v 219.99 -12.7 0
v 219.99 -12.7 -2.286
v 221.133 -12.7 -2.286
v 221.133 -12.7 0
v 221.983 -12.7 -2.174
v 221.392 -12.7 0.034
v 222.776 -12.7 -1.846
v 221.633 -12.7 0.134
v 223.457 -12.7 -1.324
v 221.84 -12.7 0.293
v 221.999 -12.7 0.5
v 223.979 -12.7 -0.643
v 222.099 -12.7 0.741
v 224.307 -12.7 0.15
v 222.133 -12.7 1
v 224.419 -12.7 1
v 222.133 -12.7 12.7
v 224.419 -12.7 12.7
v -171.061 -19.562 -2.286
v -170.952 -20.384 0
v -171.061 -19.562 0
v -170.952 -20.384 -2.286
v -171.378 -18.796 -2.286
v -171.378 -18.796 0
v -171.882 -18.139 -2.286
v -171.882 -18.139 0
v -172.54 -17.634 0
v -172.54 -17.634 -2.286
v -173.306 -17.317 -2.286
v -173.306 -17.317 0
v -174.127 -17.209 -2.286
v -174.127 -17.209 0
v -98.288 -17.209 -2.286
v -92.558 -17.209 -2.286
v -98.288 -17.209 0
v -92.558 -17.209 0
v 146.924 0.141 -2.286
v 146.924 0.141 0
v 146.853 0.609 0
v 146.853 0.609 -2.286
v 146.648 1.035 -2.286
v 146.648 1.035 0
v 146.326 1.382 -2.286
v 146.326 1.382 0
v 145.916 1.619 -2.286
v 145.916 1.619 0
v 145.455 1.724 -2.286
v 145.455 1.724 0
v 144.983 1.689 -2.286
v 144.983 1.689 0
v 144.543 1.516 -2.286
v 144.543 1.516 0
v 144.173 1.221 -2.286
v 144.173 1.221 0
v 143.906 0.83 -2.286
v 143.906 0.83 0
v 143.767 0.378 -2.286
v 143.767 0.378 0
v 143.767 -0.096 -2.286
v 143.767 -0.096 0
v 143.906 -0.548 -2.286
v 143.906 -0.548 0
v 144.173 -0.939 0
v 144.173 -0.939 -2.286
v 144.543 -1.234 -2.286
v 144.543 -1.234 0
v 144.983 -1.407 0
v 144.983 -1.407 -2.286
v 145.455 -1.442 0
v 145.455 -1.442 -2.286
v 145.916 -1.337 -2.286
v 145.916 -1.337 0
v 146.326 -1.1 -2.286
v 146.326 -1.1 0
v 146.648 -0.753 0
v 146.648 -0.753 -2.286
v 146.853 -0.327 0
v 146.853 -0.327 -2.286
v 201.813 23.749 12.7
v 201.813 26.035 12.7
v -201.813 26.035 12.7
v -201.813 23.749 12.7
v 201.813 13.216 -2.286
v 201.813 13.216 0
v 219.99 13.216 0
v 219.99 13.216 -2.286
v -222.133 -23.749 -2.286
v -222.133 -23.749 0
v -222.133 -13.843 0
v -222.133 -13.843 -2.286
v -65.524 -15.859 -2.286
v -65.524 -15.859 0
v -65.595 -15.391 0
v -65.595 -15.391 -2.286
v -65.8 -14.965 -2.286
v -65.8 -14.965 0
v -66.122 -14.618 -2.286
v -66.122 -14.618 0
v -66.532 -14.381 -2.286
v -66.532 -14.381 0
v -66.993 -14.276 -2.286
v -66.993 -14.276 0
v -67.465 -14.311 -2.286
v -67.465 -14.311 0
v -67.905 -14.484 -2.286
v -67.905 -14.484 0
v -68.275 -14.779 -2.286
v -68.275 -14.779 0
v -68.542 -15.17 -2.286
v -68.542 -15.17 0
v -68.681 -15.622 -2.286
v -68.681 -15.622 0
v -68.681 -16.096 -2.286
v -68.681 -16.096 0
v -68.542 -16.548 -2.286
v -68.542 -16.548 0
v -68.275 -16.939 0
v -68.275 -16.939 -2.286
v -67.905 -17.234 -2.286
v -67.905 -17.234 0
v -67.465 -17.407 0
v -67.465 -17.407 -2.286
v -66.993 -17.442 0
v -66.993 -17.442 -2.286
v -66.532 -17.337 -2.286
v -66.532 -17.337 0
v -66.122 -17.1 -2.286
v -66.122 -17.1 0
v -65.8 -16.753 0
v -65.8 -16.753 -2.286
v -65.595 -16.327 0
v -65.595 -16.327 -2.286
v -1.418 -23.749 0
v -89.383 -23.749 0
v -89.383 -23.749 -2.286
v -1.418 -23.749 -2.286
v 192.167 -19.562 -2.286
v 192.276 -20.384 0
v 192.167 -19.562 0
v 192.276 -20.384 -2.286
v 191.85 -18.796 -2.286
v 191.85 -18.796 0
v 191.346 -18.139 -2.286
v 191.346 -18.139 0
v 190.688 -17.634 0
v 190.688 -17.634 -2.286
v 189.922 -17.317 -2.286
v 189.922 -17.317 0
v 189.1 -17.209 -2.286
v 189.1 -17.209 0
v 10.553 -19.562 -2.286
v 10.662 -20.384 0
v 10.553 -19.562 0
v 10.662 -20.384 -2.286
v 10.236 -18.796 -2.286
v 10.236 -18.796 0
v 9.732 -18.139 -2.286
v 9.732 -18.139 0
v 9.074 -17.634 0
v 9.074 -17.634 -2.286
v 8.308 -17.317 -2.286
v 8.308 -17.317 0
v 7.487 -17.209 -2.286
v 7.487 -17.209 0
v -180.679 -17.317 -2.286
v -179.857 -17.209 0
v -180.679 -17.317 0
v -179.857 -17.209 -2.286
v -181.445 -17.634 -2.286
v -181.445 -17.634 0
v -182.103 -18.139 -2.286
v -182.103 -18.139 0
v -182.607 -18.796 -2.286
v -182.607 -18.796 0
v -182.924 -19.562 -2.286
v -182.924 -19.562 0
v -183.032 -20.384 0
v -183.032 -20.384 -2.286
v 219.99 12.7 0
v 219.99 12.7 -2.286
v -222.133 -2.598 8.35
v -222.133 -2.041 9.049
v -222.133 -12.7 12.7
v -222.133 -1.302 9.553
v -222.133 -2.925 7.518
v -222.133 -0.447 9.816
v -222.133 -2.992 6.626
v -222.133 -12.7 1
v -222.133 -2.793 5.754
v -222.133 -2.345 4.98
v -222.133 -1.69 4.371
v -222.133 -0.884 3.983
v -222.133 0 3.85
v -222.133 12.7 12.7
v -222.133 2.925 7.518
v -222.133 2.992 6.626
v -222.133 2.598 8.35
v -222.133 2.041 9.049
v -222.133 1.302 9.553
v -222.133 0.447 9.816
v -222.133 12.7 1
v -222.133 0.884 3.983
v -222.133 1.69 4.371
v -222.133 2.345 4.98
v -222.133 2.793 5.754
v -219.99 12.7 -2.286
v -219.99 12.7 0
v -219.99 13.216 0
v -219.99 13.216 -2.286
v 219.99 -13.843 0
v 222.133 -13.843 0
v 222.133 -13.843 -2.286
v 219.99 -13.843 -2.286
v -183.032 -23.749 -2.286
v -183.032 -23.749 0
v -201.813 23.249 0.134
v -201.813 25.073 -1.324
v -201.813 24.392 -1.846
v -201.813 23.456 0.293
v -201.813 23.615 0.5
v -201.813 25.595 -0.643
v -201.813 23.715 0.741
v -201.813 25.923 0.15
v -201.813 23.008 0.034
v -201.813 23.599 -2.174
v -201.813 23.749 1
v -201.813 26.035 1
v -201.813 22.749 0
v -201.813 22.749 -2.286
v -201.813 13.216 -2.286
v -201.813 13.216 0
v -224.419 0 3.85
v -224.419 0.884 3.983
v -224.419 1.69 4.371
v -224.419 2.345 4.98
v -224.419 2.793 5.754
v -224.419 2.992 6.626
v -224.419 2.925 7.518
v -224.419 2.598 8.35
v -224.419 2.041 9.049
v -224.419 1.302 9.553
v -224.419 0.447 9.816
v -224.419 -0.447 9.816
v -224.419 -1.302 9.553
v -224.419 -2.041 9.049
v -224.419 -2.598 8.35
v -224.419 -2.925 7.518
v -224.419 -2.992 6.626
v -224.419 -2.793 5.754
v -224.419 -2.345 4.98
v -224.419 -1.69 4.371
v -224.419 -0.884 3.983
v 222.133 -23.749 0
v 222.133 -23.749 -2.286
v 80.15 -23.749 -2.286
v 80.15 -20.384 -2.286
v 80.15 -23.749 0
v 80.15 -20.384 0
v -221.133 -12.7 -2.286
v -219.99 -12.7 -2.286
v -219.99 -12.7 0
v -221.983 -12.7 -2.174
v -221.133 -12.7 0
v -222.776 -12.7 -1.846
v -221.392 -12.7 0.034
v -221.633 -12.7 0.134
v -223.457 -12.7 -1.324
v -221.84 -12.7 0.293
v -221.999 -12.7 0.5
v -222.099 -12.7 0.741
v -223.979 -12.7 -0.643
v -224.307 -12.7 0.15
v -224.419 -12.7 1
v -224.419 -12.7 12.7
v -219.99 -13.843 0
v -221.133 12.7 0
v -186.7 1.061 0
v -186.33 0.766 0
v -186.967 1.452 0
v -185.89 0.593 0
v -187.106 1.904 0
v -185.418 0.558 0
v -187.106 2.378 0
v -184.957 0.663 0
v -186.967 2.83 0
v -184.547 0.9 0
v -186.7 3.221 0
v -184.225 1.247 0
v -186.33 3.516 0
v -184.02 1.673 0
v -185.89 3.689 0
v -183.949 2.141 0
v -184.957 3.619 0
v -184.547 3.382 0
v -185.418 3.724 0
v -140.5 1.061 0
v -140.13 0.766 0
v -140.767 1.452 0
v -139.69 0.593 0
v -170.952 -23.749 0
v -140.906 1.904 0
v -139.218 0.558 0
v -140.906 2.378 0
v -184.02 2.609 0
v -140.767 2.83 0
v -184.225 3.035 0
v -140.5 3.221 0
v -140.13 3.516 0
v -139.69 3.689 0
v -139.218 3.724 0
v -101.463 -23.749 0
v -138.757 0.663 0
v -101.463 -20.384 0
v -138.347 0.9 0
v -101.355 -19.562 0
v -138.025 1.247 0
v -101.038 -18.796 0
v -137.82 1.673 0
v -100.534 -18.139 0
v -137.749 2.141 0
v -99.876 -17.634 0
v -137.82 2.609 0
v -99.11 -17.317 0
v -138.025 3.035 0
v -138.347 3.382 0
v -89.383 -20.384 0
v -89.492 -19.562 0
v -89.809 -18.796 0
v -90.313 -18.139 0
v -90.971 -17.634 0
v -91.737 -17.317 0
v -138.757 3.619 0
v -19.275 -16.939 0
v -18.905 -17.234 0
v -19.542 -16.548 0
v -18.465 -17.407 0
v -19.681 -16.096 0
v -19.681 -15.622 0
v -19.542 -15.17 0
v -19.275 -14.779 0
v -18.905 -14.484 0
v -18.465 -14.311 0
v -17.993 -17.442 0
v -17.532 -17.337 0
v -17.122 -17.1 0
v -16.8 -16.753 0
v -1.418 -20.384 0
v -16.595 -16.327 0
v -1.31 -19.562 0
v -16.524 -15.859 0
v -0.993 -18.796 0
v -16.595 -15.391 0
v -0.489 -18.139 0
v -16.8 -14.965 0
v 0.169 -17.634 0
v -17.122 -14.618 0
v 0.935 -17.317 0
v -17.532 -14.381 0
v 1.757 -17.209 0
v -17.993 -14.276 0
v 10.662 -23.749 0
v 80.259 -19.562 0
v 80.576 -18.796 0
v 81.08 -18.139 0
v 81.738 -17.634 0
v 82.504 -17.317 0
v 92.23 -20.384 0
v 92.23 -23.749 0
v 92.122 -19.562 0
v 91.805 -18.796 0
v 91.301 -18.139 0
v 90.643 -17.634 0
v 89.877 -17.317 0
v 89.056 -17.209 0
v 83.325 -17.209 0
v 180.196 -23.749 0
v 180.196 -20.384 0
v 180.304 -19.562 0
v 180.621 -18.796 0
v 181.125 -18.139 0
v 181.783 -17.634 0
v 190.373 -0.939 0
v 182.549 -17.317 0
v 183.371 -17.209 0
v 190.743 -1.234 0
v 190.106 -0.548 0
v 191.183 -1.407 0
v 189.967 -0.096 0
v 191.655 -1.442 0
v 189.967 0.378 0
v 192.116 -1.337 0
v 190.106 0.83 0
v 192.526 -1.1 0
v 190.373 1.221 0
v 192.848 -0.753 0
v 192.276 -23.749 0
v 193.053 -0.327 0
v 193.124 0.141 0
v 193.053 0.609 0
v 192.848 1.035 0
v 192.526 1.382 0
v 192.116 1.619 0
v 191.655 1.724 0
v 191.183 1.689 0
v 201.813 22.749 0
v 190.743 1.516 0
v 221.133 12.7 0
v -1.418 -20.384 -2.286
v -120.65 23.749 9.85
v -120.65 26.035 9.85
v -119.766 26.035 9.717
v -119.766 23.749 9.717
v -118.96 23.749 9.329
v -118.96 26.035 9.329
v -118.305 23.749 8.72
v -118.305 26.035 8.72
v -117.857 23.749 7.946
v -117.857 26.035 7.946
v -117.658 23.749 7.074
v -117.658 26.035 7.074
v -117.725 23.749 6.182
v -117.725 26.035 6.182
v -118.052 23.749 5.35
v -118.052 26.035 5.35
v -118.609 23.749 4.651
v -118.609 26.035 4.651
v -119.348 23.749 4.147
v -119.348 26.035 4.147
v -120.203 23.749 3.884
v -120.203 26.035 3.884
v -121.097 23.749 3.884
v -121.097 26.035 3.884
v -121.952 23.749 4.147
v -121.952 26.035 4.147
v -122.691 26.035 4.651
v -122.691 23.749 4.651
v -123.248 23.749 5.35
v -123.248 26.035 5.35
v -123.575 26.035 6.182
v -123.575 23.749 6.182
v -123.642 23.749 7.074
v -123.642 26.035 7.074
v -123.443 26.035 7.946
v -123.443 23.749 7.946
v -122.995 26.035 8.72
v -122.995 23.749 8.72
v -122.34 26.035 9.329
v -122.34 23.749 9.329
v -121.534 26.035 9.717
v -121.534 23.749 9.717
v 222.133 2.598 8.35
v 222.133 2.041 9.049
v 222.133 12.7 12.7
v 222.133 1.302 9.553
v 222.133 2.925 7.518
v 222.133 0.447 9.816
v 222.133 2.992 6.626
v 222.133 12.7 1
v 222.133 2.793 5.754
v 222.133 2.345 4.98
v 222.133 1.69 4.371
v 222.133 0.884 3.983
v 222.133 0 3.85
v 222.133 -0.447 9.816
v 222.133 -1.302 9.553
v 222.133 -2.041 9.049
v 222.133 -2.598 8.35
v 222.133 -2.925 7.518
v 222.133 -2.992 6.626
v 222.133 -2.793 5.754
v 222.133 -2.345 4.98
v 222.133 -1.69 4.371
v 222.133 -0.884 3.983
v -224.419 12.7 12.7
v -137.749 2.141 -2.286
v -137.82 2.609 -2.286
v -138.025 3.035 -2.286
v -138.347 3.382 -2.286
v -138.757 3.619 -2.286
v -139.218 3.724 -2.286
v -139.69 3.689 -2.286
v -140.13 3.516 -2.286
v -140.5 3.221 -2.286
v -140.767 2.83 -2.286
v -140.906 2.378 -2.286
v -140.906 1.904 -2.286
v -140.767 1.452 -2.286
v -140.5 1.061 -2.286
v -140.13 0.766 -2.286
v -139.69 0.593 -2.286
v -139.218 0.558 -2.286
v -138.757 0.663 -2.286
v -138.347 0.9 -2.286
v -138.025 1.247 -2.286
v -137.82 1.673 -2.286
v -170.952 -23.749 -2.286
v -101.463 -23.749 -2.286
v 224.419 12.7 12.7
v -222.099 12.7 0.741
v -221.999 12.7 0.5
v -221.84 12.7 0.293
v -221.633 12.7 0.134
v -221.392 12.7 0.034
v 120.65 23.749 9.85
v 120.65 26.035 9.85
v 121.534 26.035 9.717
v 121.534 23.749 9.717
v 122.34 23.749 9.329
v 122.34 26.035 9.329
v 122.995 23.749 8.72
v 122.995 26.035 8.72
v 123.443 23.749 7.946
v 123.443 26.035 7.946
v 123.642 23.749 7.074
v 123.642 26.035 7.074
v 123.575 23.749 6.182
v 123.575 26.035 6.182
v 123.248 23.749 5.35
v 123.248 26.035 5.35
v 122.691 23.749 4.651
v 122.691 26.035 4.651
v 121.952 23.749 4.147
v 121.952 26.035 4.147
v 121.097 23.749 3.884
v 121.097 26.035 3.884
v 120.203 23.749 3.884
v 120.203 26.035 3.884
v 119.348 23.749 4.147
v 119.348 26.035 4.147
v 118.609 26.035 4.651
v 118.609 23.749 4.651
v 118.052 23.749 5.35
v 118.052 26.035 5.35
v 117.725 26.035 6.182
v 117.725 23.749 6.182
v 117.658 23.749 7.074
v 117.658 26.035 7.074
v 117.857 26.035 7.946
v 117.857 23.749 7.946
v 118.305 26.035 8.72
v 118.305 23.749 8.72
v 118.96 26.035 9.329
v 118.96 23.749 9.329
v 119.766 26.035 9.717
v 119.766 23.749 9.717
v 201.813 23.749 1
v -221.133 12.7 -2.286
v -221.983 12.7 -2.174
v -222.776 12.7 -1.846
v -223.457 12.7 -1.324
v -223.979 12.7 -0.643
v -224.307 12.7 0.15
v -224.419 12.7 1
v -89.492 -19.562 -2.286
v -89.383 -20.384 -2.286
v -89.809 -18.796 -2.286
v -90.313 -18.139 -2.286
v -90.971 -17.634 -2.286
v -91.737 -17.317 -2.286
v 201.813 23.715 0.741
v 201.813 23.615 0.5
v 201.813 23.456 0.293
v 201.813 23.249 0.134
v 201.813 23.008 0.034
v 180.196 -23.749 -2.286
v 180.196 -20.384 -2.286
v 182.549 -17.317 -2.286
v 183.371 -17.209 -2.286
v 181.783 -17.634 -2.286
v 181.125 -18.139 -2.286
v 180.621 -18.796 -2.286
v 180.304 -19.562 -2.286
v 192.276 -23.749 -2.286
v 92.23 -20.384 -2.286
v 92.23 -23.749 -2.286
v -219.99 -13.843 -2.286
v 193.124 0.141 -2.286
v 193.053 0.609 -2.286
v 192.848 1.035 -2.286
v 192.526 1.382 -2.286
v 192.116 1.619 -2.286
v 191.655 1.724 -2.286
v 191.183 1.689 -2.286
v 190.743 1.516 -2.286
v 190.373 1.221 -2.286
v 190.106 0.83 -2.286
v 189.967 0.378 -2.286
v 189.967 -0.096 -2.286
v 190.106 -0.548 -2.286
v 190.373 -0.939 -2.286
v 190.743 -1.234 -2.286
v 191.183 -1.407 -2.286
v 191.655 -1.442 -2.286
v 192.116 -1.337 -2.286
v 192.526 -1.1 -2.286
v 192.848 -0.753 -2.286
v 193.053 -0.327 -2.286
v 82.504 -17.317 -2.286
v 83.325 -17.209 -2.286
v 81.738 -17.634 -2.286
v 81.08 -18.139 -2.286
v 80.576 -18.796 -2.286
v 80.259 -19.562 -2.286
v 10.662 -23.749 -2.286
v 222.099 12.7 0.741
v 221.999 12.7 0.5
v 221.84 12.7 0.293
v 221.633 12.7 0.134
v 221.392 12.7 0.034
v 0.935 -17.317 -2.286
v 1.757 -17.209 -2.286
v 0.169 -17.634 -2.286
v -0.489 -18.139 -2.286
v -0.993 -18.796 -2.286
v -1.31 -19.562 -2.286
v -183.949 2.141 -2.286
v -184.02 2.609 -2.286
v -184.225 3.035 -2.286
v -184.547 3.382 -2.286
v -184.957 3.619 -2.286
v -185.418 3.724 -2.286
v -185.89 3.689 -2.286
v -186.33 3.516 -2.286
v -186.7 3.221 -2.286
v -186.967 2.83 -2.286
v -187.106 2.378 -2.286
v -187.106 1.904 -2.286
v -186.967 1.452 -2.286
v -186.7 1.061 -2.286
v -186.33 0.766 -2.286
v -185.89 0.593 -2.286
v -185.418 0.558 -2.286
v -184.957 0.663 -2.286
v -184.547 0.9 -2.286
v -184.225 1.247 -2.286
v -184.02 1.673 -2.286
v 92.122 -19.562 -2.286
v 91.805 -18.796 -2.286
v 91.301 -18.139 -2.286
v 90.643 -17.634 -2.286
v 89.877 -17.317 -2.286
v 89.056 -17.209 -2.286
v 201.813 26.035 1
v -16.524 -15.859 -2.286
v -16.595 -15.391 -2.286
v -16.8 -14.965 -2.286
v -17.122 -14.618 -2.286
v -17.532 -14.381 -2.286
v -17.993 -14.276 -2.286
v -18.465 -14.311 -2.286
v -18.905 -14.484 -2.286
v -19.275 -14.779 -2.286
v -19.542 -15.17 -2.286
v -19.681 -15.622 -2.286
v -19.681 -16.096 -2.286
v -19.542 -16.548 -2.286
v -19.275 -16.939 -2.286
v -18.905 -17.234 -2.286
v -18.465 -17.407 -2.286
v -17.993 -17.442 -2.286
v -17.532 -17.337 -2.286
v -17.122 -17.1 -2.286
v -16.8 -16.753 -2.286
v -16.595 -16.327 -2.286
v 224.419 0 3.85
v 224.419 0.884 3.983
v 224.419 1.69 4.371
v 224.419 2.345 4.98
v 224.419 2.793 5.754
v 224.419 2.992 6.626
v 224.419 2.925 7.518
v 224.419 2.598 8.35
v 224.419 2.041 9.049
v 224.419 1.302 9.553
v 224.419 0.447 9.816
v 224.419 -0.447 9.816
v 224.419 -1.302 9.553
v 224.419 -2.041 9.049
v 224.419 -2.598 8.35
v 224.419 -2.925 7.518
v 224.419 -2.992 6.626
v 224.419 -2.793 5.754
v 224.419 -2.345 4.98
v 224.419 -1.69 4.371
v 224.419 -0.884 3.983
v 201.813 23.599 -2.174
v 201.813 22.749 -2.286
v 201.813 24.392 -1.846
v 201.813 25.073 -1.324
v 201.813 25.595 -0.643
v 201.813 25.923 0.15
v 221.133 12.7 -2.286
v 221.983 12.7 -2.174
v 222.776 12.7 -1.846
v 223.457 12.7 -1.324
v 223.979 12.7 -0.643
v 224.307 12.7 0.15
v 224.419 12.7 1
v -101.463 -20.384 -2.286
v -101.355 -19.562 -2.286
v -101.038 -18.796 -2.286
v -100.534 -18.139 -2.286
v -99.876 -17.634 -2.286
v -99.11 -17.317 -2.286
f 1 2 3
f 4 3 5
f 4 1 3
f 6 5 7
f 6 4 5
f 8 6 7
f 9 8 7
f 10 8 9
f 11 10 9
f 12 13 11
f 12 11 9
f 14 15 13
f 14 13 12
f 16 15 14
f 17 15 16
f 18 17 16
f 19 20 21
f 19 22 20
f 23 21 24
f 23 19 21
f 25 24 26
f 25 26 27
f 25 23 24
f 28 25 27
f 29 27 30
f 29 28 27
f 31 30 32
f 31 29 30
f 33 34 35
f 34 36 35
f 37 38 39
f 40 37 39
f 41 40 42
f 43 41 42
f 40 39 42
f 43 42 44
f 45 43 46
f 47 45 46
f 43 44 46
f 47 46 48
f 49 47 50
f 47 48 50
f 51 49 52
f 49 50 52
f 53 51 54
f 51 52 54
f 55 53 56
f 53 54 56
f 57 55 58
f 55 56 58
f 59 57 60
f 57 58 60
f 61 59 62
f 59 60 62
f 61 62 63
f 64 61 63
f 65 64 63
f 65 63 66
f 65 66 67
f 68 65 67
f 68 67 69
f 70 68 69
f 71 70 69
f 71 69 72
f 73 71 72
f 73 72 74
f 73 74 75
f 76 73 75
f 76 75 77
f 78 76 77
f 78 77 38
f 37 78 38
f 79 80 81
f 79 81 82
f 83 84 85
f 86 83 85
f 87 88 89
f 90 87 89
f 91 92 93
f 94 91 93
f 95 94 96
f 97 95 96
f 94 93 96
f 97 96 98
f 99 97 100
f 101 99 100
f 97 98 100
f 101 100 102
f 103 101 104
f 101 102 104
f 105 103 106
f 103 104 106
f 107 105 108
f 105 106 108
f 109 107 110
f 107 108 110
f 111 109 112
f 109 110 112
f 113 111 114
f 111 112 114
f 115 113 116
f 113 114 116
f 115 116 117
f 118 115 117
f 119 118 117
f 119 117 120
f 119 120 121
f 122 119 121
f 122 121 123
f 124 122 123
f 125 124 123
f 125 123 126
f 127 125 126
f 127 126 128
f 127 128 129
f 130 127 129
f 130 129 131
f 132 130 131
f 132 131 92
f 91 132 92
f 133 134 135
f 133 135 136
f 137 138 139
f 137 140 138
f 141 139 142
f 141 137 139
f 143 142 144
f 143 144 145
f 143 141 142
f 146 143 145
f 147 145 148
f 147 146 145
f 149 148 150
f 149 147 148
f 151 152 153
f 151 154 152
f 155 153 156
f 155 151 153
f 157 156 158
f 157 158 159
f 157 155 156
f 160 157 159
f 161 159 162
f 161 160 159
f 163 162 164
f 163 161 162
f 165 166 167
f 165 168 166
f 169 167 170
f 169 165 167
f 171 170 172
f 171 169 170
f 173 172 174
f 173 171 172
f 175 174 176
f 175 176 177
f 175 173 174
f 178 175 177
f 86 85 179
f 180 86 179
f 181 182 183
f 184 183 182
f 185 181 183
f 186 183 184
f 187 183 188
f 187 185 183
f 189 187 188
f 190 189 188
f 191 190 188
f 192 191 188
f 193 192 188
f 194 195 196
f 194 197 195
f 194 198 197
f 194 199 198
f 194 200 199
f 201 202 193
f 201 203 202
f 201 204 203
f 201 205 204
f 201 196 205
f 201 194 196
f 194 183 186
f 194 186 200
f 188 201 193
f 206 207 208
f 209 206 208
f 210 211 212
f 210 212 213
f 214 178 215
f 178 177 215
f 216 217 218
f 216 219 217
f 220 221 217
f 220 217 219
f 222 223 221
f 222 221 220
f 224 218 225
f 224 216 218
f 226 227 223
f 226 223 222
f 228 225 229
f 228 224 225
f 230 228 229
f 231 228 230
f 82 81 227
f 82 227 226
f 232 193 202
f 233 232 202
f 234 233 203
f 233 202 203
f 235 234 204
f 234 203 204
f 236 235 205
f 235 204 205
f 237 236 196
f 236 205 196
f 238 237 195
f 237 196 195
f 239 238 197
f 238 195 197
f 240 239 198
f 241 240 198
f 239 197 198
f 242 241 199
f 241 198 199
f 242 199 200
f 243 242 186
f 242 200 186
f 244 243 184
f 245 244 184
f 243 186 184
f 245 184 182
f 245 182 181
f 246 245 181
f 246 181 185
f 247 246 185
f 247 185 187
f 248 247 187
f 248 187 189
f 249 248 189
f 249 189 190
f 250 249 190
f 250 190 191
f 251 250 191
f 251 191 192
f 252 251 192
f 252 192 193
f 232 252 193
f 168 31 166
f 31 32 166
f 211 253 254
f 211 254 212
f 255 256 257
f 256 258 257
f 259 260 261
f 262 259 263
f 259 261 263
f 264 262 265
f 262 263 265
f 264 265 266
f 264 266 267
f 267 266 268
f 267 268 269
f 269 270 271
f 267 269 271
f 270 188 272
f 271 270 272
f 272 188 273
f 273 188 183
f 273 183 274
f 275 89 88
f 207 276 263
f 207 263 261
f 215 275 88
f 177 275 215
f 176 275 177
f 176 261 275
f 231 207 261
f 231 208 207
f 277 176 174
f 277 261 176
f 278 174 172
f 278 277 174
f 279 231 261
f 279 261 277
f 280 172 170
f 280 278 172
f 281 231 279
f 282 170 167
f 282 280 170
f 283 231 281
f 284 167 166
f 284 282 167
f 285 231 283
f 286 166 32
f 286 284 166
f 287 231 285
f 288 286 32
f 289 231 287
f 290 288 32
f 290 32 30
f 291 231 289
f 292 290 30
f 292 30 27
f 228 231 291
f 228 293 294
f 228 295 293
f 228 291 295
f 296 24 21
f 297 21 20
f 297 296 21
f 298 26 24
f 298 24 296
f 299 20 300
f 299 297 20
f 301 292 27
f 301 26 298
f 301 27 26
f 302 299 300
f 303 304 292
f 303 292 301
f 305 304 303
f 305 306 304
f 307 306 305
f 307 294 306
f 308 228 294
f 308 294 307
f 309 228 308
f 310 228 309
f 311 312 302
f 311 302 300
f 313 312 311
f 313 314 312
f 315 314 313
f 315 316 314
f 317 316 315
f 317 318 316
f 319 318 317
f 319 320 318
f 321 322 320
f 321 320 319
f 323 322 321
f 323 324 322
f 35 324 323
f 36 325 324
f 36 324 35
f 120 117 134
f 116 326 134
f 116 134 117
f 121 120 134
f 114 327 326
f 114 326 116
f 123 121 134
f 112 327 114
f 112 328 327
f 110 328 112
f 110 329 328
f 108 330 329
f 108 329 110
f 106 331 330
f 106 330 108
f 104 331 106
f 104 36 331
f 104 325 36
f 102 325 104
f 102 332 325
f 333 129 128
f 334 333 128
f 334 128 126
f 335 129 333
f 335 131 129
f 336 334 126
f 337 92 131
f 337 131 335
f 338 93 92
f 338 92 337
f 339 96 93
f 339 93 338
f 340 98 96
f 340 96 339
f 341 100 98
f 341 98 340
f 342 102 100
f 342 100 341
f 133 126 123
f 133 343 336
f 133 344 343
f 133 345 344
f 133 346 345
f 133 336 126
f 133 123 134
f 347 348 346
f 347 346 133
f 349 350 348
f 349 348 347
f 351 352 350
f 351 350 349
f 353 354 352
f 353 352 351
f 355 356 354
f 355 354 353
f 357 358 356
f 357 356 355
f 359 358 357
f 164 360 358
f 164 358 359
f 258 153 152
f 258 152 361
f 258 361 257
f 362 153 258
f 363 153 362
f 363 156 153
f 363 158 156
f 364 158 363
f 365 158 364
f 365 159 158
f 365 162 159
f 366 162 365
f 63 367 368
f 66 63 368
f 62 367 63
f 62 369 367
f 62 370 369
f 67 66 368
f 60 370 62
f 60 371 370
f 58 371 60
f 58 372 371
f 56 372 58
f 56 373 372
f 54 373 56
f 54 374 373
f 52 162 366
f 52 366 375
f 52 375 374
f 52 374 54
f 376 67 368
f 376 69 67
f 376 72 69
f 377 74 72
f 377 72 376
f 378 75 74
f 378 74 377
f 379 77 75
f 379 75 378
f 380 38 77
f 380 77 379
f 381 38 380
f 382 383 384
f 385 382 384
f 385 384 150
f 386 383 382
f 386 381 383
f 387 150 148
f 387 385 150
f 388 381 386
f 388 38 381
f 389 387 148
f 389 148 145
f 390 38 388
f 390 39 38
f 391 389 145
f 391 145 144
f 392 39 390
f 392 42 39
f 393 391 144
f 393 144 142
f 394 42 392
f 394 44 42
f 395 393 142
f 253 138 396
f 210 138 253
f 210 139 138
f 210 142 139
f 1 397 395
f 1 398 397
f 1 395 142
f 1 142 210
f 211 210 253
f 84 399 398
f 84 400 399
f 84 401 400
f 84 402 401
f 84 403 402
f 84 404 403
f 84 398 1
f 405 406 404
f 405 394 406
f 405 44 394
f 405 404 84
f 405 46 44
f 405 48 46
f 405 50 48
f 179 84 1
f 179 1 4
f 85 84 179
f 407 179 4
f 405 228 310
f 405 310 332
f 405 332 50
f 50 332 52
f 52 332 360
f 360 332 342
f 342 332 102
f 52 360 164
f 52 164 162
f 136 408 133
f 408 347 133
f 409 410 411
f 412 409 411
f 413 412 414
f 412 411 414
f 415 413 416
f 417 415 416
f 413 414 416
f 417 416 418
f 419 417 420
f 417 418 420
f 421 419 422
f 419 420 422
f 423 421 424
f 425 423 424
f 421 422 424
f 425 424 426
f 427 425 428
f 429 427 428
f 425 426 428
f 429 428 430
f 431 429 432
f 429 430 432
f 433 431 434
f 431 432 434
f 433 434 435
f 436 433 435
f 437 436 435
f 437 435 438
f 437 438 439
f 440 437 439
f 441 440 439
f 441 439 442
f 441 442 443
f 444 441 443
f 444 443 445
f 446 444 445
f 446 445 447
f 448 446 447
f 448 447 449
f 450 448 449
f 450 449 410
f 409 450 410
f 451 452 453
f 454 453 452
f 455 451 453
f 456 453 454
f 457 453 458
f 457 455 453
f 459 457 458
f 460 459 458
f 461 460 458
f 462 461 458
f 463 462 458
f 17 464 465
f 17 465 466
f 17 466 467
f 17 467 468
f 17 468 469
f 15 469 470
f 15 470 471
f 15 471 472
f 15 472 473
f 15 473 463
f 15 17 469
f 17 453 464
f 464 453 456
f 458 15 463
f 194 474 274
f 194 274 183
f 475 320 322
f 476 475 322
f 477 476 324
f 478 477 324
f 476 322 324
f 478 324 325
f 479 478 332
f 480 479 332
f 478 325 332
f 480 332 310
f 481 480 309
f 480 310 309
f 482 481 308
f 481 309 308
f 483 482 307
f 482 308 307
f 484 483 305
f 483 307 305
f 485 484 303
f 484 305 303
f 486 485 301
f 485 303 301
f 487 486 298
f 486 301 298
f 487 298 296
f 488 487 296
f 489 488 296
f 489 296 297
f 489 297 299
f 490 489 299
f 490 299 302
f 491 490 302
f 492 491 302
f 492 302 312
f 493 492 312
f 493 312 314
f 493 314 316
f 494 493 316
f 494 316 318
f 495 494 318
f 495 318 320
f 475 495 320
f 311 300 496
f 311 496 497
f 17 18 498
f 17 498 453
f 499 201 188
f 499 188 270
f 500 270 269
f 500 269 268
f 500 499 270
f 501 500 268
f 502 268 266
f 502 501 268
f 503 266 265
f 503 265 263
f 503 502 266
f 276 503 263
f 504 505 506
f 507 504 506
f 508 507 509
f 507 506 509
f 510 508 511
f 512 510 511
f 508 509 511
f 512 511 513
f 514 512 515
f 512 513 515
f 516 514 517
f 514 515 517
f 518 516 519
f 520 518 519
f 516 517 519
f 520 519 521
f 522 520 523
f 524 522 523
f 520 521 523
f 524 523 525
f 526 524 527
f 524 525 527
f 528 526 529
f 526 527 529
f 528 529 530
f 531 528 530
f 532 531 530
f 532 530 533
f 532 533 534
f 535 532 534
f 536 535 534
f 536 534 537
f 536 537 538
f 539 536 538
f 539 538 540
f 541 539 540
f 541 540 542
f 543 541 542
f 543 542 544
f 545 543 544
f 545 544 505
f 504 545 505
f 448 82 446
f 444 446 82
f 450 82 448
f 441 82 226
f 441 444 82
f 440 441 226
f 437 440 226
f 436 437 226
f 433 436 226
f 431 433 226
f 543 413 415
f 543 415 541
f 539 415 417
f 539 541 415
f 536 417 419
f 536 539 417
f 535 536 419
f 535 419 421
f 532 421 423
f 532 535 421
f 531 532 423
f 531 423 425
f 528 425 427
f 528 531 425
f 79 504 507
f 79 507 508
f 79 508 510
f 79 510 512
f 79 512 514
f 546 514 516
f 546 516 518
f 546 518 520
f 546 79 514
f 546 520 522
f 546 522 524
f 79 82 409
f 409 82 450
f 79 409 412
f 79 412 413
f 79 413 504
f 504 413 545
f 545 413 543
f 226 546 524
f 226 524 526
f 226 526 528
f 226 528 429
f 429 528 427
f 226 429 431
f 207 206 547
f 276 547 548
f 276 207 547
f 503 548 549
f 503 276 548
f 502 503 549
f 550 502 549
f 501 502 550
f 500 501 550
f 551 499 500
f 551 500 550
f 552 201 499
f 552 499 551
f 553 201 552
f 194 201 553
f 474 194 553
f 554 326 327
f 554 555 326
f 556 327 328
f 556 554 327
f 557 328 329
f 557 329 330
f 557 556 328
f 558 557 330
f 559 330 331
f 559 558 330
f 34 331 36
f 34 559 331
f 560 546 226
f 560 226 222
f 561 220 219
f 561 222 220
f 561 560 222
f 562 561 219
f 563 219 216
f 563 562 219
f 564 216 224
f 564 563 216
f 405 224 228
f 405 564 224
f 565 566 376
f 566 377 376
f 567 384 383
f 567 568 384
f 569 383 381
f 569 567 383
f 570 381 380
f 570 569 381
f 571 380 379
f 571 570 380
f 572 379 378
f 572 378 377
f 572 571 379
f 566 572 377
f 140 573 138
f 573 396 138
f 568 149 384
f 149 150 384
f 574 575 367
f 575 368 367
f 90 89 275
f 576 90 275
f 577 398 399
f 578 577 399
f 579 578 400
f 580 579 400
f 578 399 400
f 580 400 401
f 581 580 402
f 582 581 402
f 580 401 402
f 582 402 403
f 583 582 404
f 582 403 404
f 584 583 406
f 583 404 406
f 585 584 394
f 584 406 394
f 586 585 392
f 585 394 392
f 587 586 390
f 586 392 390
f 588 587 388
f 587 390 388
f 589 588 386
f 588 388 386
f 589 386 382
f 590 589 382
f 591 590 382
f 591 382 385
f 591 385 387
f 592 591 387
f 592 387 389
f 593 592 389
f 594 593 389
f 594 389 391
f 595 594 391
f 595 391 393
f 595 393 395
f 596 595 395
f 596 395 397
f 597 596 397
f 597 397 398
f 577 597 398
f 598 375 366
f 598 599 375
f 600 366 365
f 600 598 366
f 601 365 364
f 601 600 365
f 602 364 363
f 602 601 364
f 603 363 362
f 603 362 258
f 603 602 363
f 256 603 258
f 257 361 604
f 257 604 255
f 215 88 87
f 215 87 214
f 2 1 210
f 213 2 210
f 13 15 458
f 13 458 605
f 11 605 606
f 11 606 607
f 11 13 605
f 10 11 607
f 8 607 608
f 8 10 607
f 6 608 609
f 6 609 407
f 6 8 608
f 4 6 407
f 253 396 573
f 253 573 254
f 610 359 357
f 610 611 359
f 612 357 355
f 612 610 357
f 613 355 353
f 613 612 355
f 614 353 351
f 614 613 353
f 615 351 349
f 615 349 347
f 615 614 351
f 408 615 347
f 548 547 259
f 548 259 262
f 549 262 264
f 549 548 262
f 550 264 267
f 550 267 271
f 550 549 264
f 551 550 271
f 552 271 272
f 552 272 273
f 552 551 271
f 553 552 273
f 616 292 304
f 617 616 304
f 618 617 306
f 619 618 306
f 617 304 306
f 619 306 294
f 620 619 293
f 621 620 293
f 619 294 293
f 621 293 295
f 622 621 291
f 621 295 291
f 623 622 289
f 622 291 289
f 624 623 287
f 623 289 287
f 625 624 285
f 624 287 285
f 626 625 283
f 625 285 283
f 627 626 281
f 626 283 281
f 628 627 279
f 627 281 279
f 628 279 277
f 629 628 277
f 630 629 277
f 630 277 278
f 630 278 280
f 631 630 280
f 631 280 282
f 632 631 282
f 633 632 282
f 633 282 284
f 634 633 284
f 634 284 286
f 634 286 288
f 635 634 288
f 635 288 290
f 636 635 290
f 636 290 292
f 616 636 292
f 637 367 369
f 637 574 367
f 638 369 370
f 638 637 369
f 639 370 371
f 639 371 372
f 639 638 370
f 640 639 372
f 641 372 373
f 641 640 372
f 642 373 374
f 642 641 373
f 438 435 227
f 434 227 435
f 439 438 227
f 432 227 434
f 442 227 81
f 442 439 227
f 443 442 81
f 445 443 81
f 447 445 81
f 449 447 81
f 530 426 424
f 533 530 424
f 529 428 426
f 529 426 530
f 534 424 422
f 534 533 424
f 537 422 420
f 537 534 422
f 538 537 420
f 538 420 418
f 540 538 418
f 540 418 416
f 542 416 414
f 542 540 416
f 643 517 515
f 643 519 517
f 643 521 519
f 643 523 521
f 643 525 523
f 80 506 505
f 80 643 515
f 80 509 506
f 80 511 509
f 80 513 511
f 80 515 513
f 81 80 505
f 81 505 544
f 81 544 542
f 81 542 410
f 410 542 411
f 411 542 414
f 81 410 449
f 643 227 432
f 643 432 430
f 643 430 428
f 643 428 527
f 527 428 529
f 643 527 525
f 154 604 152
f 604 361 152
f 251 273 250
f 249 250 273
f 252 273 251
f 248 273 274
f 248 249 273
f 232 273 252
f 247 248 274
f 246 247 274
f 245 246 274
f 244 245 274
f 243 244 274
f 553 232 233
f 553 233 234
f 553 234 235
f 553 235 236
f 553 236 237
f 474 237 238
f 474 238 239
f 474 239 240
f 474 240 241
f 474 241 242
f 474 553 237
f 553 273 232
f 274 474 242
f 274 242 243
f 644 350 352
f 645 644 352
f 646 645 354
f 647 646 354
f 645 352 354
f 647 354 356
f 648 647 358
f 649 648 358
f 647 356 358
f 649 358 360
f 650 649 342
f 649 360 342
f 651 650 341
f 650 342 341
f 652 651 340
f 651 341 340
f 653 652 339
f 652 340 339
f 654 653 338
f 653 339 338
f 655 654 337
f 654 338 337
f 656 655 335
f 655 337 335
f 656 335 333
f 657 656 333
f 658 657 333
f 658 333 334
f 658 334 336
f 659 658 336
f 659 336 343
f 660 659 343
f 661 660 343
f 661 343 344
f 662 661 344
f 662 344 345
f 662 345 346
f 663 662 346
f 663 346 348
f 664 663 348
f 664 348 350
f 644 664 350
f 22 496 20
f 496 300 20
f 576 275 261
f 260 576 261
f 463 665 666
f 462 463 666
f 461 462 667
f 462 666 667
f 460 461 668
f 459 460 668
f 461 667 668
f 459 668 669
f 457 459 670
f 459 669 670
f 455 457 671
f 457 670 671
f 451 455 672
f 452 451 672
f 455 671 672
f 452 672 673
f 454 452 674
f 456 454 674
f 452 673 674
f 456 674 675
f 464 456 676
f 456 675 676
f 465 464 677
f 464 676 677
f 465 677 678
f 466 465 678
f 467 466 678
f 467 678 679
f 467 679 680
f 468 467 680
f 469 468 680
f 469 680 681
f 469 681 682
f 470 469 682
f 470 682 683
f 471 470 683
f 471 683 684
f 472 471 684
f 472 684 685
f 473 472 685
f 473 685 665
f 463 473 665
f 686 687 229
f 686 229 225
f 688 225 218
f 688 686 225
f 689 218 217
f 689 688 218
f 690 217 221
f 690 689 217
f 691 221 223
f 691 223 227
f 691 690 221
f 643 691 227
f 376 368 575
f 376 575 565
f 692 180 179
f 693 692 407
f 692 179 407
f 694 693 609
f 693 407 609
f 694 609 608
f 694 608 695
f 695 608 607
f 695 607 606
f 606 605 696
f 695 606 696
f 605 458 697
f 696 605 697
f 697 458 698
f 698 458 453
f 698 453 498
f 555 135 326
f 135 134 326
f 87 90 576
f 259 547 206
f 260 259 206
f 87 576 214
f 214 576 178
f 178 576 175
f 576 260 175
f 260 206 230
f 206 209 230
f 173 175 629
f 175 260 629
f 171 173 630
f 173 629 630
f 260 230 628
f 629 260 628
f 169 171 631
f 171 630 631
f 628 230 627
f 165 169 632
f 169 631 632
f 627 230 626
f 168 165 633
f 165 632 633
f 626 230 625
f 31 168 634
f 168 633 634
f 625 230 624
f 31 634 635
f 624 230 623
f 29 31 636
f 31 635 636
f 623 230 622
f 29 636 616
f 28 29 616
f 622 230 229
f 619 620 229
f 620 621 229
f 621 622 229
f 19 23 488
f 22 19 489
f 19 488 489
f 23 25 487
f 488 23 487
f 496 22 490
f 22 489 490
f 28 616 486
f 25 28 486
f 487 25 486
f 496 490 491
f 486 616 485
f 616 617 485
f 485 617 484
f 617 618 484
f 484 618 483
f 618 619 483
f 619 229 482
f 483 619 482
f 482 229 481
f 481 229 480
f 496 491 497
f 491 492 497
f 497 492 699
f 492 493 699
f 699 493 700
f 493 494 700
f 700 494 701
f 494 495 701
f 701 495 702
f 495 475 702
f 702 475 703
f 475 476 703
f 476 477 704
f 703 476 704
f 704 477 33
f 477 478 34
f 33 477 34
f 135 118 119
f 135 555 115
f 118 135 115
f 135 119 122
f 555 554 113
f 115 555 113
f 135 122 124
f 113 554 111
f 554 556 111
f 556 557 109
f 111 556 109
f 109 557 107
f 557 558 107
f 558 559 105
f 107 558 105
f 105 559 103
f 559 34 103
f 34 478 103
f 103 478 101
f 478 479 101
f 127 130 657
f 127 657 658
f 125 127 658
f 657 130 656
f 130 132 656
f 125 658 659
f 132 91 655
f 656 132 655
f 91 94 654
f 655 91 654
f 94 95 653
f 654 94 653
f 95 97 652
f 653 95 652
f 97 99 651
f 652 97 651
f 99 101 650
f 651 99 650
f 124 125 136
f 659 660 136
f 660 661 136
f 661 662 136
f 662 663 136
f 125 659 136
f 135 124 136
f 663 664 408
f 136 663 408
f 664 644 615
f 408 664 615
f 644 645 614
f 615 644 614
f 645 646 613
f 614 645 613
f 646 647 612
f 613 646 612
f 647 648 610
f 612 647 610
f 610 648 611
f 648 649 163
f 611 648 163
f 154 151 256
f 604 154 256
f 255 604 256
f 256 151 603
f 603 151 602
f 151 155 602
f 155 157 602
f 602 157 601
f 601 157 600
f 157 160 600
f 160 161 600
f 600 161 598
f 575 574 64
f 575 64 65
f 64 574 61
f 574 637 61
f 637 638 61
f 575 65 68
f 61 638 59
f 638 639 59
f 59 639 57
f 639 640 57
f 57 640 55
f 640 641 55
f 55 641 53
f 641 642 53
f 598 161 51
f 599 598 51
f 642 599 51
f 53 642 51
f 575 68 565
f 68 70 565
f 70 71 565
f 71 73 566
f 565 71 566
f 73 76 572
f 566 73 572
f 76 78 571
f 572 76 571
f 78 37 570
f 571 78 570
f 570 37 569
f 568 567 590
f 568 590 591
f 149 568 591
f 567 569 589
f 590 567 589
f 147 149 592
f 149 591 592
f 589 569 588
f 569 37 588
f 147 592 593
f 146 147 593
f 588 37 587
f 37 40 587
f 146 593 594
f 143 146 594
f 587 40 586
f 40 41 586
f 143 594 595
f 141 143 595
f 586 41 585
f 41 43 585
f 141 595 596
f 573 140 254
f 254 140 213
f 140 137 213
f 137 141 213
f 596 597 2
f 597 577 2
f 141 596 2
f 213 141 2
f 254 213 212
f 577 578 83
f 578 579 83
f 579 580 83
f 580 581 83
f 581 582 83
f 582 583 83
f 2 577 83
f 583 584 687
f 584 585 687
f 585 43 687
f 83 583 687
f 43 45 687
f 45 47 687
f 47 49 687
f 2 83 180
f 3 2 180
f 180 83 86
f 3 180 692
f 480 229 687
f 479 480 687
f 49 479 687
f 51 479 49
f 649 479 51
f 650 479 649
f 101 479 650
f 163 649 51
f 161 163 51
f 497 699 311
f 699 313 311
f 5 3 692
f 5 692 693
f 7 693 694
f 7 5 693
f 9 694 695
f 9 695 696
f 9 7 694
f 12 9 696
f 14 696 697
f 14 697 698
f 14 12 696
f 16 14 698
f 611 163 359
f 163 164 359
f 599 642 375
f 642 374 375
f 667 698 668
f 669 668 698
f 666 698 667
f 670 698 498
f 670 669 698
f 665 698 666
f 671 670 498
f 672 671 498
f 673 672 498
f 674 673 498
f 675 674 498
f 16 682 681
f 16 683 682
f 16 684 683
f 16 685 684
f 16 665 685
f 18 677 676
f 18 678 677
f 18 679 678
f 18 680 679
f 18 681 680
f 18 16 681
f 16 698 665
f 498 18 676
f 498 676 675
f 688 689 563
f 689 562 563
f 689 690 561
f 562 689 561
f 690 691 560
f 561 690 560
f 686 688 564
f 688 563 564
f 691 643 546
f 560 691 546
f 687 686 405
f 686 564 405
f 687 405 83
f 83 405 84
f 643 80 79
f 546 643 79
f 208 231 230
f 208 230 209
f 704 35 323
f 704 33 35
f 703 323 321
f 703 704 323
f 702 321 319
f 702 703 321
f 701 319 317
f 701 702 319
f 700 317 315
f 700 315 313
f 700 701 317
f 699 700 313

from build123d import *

# Parameters (mm, degrees)
SKETCH1_W                     = 444.26599996
SKETCH1_H                     = 47.498
BASE_FLANGE1_DEPTH            = 2.286
EDGE_FLANGE1_STRIP_W          = 11.144
EDGE_FLANGE1_STRIP_H          = 2.286
EDGE_FLANGE1_STRIP_CUT_DEPTH  = 25.4
EDGE_FLANGE1_RELIEF_W         = 12.287
EDGE_FLANGE1_RELIEF_H         = 1.143
EDGE_FLANGE1_RELIEF_CUT_DEPTH = 2.286
EDGE_FLANGE1_DEPTH            = 25.4
EDGE_FLANGE2_STRIP_W          = 11.144
EDGE_FLANGE2_STRIP_H          = 2.286
EDGE_FLANGE2_STRIP_CUT_DEPTH  = 25.4
EDGE_FLANGE2_RELIEF_W         = 12.287
EDGE_FLANGE2_RELIEF_H         = 1.143
EDGE_FLANGE2_RELIEF_CUT_DEPTH = 2.286
EDGE_FLANGE2_DEPTH            = 25.4
EDGE_FLANGE6_STRIP_W          = 11.144
EDGE_FLANGE6_STRIP_H          = 2.286
EDGE_FLANGE6_STRIP_CUT_DEPTH  = 444.26599996
EDGE_FLANGE6_DEPTH            = 444.26599996
SKETCH52_R                    = 3
CUT_EXTRUDE2_DEPTH            = 231.225159807
SKETCH53_R                    = 3
CUT_EXTRUDE3_DEPTH            = 450.771788169
SKETCH54_W                    = 20.32
SKETCH54_H                    = 5.08
SKETCH54_H_2                  = 7.739
SKETCH54_H_3                  = 4.453
CUT_EXTRUDE4_DEPTH            = 227.280796306
CUT_EXTRUDE5_DEPTH            = 227.280796306
FILLET1_R                     = 3.175
SKETCH57_R                    = 1.5875
CUT_EXTRUDE6_DEPTH            = 227.280796306


# Sheet-metal steps are written as plain solids
with BuildPart() as part:
    # Sketch1 → Base-Flange1 (new body)
    with BuildSketch(Plane.XY):
        Rectangle(SKETCH1_W, SKETCH1_H)
    extrude(amount=-BASE_FLANGE1_DEPTH)

    # Edge-Flange1 strip (across the edge) → Edge-Flange1 strip cut (cut)
    with BuildSketch(Plane(origin=(222.13299998, -12.7, 0), x_dir=(-1, 0, 0), z_dir=(0, 1, 0))):
        with Locations((-4.572, -1.143)):
            Rectangle(EDGE_FLANGE1_STRIP_W, EDGE_FLANGE1_STRIP_H)
    extrude(amount=EDGE_FLANGE1_STRIP_CUT_DEPTH, mode=Mode.SUBTRACT)

    # Edge-Flange1 relief (on the sheet) → Edge-Flange1 relief cut (cut)
    with BuildSketch(Plane(origin=(221.13299998, -12.7, 0), x_dir=(-1, 0, 0), z_dir=(0, 0, 1))):
        with Locations((-5.0005, 0.5715)):
            Rectangle(EDGE_FLANGE1_RELIEF_W, EDGE_FLANGE1_RELIEF_H)
        with Locations((-5.0005, -25.9715)):
            Rectangle(EDGE_FLANGE1_RELIEF_W, EDGE_FLANGE1_RELIEF_H)
    extrude(amount=-EDGE_FLANGE1_RELIEF_CUT_DEPTH, mode=Mode.SUBTRACT)

    # Edge-Flange1 section (across the edge) → Edge-Flange1 (add)
    with BuildSketch(Plane(origin=(222.13299998, -12.7, 0), x_dir=(-1, 0, 0), z_dir=(0, 1, 0))):
        with BuildLine():
            Line((-2.286, 1), (-2.286, 12.7))
            Line((-2.286, 12.7), (0, 12.7))
            Line((0, 12.7), (0, 1))
            ThreePointArc((0, 1), (0.292893219, 0.292893219), (1, 0))
            Line((1, 0), (1, -2.286))
            ThreePointArc((1, -2.286), (-1.323552883, -1.323552883), (-2.286, 1))
        make_face()
    extrude(amount=EDGE_FLANGE1_DEPTH)

    # Edge-Flange2 strip (across the edge) → Edge-Flange2 strip cut (cut)
    with BuildSketch(Plane(origin=(-222.13299998, 12.7, 0), x_dir=(1, 0, 0), z_dir=(0, -1, 0))):
        with Locations((-4.572, -1.143)):
            Rectangle(EDGE_FLANGE2_STRIP_W, EDGE_FLANGE2_STRIP_H)
    extrude(amount=EDGE_FLANGE2_STRIP_CUT_DEPTH, mode=Mode.SUBTRACT)

    # Edge-Flange2 relief (on the sheet) → Edge-Flange2 relief cut (cut)
    with BuildSketch(Plane(origin=(-221.13299998, 12.7, 0), x_dir=(1, 0, 0), z_dir=(0, 0, 1))):
        with Locations((-5.0005, 0.5715)):
            Rectangle(EDGE_FLANGE2_RELIEF_W, EDGE_FLANGE2_RELIEF_H)
        with Locations((-5.0005, -25.9715)):
            Rectangle(EDGE_FLANGE2_RELIEF_W, EDGE_FLANGE2_RELIEF_H)
    extrude(amount=-EDGE_FLANGE2_RELIEF_CUT_DEPTH, mode=Mode.SUBTRACT)

    # Edge-Flange2 section (across the edge) → Edge-Flange2 (add)
    with BuildSketch(Plane(origin=(-222.13299998, 12.7, 0), x_dir=(1, 0, 0), z_dir=(0, -1, 0))):
        with BuildLine():
            Line((-2.286, 1), (-2.286, 12.7))
            Line((-2.286, 12.7), (0, 12.7))
            Line((0, 12.7), (0, 1))
            ThreePointArc((0, 1), (0.292893219, 0.292893219), (1, 0))
            Line((1, 0), (1, -2.286))
            ThreePointArc((1, -2.286), (-1.323552883, -1.323552883), (-2.286, 1))
        make_face()
    extrude(amount=EDGE_FLANGE2_DEPTH)

    # Edge-Flange6 strip (across the edge) → Edge-Flange6 strip cut (cut)
    with BuildSketch(Plane(origin=(222.13299998, 23.749, 0), x_dir=(0, -1, 0), z_dir=(-1, 0, 0))):
        with Locations((-4.572, -1.143)):
            Rectangle(EDGE_FLANGE6_STRIP_W, EDGE_FLANGE6_STRIP_H)
    extrude(amount=EDGE_FLANGE6_STRIP_CUT_DEPTH, mode=Mode.SUBTRACT)

    # Edge-Flange6 section (across the edge) → Edge-Flange6 (add)
    with BuildSketch(Plane(origin=(222.13299998, 23.749, 0), x_dir=(0, -1, 0), z_dir=(-1, 0, 0))):
        with BuildLine():
            Line((-2.286, 1), (-2.286, 12.7))
            Line((-2.286, 12.7), (0, 12.7))
            Line((0, 12.7), (0, 1))
            ThreePointArc((0, 1), (0.292893219, 0.292893219), (1, 0))
            Line((1, 0), (1, -2.286))
            ThreePointArc((1, -2.286), (-1.323552883, -1.323552883), (-2.286, 1))
        make_face()
    extrude(amount=EDGE_FLANGE6_DEPTH)

    # Sketch52 → Cut-Extrude2 (cut, through all)
    with BuildSketch(Plane(origin=(0, 26.035, 0), x_dir=(1, 0, 0), z_dir=(0, 1, 0))):
        with Locations(Location((120.65, -6.85, 0), (0, 0, 270))):
            Circle(SKETCH52_R)
        with Locations(Location((-120.65, -6.85, 0), (0, 0, 270))):
            Circle(SKETCH52_R)
    extrude(amount=-CUT_EXTRUDE2_DEPTH, mode=Mode.SUBTRACT)

    # Sketch53 → Cut-Extrude3 (cut, through all)
    with BuildSketch(Plane(origin=(224.41899998, 0, 0), x_dir=(0, 0, -1), z_dir=(1, 0, 0))):
        with Locations((-6.85, 0)):
            Circle(SKETCH53_R)
    extrude(amount=-CUT_EXTRUDE3_DEPTH, mode=Mode.SUBTRACT)

    # Sketch54 → Cut-Extrude4 (cut, symmetric)
    with BuildSketch(Plane.XY):
        with Locations((211.97299998, 15.756)):
            Rectangle(SKETCH54_W, SKETCH54_H)
        with Locations((211.97299998, 22.1655)):
            Rectangle(SKETCH54_W, SKETCH54_H_2)
        with Locations((211.97299998, 20.5225)):
            Rectangle(SKETCH54_W, SKETCH54_H_3)
    cut_extrude4 = extrude(amount=CUT_EXTRUDE4_DEPTH, both=True, mode=Mode.SUBTRACT)

    # Mirror1: Cut-Extrude4 across plane
    add(cut_extrude4.mirror(Plane(origin=(0, 0, 0), x_dir=(0, 0, 1), z_dir=(1, 0, 0))), mode=Mode.SUBTRACT)

    # Sketch55 → Cut-Extrude5 (cut, through all)
    # profile 1 of 15: a face of its own
    with BuildSketch(Plane.XY):
        Polygon((-179.589939095, -42.289), (-174.395060873, -42.289), (-172.452499984, -40.346439111), (-172.452499984, -26.101102448), (-170.952499984, -24.601102448), (-170.952499984, -18.896897552), (-172.640397536, -17.209), (-181.344602432, -17.209), (-183.032499984, -18.896897552), (-183.032499984, -24.601102448), (-181.532499984, -26.101102448), (-181.532499984, -40.346439111), align=None)
        with BuildLine():
            Line((-174.992499984, -39.294336663), (-175.447163321, -39.749))
            Line((-175.447163321, -39.749), (-178.537836647, -39.749))
            Line((-178.537836647, -39.749), (-178.992499984, -39.294336663))
            Line((-178.992499984, -39.294336663), (-178.992499984, -23.949))
            ThreePointArc((-178.992499984, -23.949), (-179.051078628, -23.807578644), (-179.192499984, -23.749))
            Line((-179.192499984, -23.749), (-180.292499984, -23.749))
            Line((-180.292499984, -23.749), (-180.492499984, -23.549))
            Line((-180.492499984, -23.549), (-180.492499984, -19.949))
            Line((-180.492499984, -19.949), (-180.292499984, -19.749))
            Line((-180.292499984, -19.749), (-173.692499984, -19.749))
            Line((-173.692499984, -19.749), (-173.492499984, -19.949))
            Line((-173.492499984, -19.949), (-173.492499984, -23.549))
            Line((-173.492499984, -23.549), (-173.692499984, -23.749))
            Line((-173.692499984, -23.749), (-174.792499984, -23.749))
            ThreePointArc((-174.792499984, -23.749), (-174.93392134, -23.807578644), (-174.992499984, -23.949))
            Line((-174.992499984, -23.949), (-174.992499984, -39.294336663))
        make_face(mode=Mode.SUBTRACT)
    # profile 2 of 15: a face of its own
    with BuildSketch(Plane.XY):
        Polygon((-172.640397536, -17.209), (-170.952499984, -18.896897552), (-170.952499984, -17.209), align=None)
    # profile 3 of 15: a face of its own
    with BuildSketch(Plane.XY):
        Polygon((-183.032499984, -17.209), (-183.032499984, -18.896897552), (-181.344602432, -17.209), align=None)
    # profile 4 of 15: a face of its own
    with BuildSketch(Plane.XY):
        Polygon((-90.883499992, -40.346439111), (-90.883499992, -26.101102448), (-89.383499992, -24.601102448), (-89.383499992, -18.896897552), (-91.071397544, -17.209), (-99.77560244, -17.209), (-101.463499992, -18.896897552), (-101.463499992, -24.601102448), (-99.963499992, -26.101102448), (-99.963499992, -40.346439111), (-98.020939103, -42.289), (-92.826060881, -42.289), align=None)
        with BuildLine():
            ThreePointArc((-93.223499992, -23.749), (-93.364921348, -23.807578644), (-93.423499992, -23.949))
            Line((-93.423499992, -23.949), (-93.423499992, -39.294336663))
            Line((-93.423499992, -39.294336663), (-93.878163329, -39.749))
            Line((-93.878163329, -39.749), (-96.968836655, -39.749))
            Line((-96.968836655, -39.749), (-97.423499992, -39.294336663))
            Line((-97.423499992, -39.294336663), (-97.423499992, -23.949))
            ThreePointArc((-97.423499992, -23.949), (-97.482078636, -23.807578644), (-97.623499992, -23.749))
            Line((-97.623499992, -23.749), (-98.723499992, -23.749))
            Line((-98.723499992, -23.749), (-98.923499992, -23.549))
            Line((-98.923499992, -23.549), (-98.923499992, -19.949))
            Line((-98.923499992, -19.949), (-98.723499992, -19.749))
            Line((-98.723499992, -19.749), (-92.123499992, -19.749))
            Line((-92.123499992, -19.749), (-91.923499992, -19.949))
            Line((-91.923499992, -19.949), (-91.923499992, -23.549))
            Line((-91.923499992, -23.549), (-92.123499992, -23.749))
            Line((-92.123499992, -23.749), (-93.223499992, -23.749))
        make_face(mode=Mode.SUBTRACT)
    # profile 5 of 15: a face of its own
    with BuildSketch(Plane.XY):
        Polygon((-91.071397544, -17.209), (-89.383499992, -18.896897552), (-89.383499992, -17.209), align=None)
    # profile 6 of 15: a face of its own
    with BuildSketch(Plane.XY):
        Polygon((-101.463499992, -18.896897552), (-99.77560244, -17.209), (-101.463499992, -17.209), align=None)
    # profile 7 of 15: a face of its own
    with BuildSketch(Plane.XY):
        Polygon((2.024060897, -42.289), (7.218939119, -42.289), (9.161500008, -40.346439111), (9.161500008, -26.101102448), (10.661500008, -24.601102448), (10.661500008, -18.896897552), (8.973602456, -17.209), (0.26939756, -17.209), (-1.418499992, -18.896897552), (-1.418499992, -24.601102448), (0.081500008, -26.101102448), (0.081500008, -40.346439111), align=None)
        with BuildLine():
            Line((6.621500008, -39.294336663), (6.166836671, -39.749))
            Line((6.166836671, -39.749), (3.076163345, -39.749))
            Line((3.076163345, -39.749), (2.621500008, -39.294336663))
            Line((2.621500008, -39.294336663), (2.621500008, -23.949))
            ThreePointArc((2.621500008, -23.949), (2.562921364, -23.807578644), (2.421500008, -23.749))
            Line((2.421500008, -23.749), (1.321500008, -23.749))
            Line((1.321500008, -23.749), (1.121500008, -23.549))
            Line((1.121500008, -23.549), (1.121500008, -19.949))
            Line((1.121500008, -19.949), (1.321500008, -19.749))
            Line((1.321500008, -19.749), (7.921500008, -19.749))
            Line((7.921500008, -19.749), (8.121500008, -19.949))
            Line((8.121500008, -19.949), (8.121500008, -23.549))
            Line((8.121500008, -23.549), (7.921500008, -23.749))
            Line((7.921500008, -23.749), (6.821500008, -23.749))
            ThreePointArc((6.821500008, -23.749), (6.680078652, -23.807578644), (6.621500008, -23.949))
            Line((6.621500008, -23.949), (6.621500008, -39.294336663))
        make_face(mode=Mode.SUBTRACT)
    # profile 8 of 15: a face of its own
    with BuildSketch(Plane.XY):
        Polygon((8.973602456, -17.209), (10.661500008, -18.896897552), (10.661500008, -17.209), align=None)
    # profile 9 of 15: a face of its own
    with BuildSketch(Plane.XY):
        Polygon((-1.418499992, -17.209), (-1.418499992, -18.896897552), (0.26939756, -17.209), align=None)
    # profile 10 of 15: a face of its own
    with BuildSketch(Plane.XY):
        Polygon((90.7305, -40.346439111), (90.7305, -26.101102448), (92.2305, -24.601102448), (92.2305, -18.896897552), (90.542602448, -17.209), (81.838397552, -17.209), (80.1505, -18.896897552), (80.1505, -24.601102448), (81.6505, -26.101102448), (81.6505, -40.346439111), (83.593060889, -42.289), (88.787939111, -42.289), align=None)
        with BuildLine():
            ThreePointArc((88.3905, -23.749), (88.249078644, -23.807578644), (88.1905, -23.949))
            Line((88.1905, -23.949), (88.1905, -39.294336663))
            Line((88.1905, -39.294336663), (87.735836663, -39.749))
            Line((87.735836663, -39.749), (84.645163337, -39.749))
            Line((84.645163337, -39.749), (84.1905, -39.294336663))
            Line((84.1905, -39.294336663), (84.1905, -23.949))
            ThreePointArc((84.1905, -23.949), (84.131921356, -23.807578644), (83.9905, -23.749))
            Line((83.9905, -23.749), (82.8905, -23.749))
            Line((82.8905, -23.749), (82.6905, -23.549))
            Line((82.6905, -23.549), (82.6905, -19.949))
            Line((82.6905, -19.949), (82.8905, -19.749))
            Line((82.8905, -19.749), (89.4905, -19.749))
            Line((89.4905, -19.749), (89.6905, -19.949))
            Line((89.6905, -19.949), (89.6905, -23.549))
            Line((89.6905, -23.549), (89.4905, -23.749))
            Line((89.4905, -23.749), (88.3905, -23.749))
        make_face(mode=Mode.SUBTRACT)
    # profile 11 of 15: a face of its own
    with BuildSketch(Plane.XY):
        Polygon((90.542602448, -17.209), (92.2305, -18.896897552), (92.2305, -17.209), align=None)
    # profile 12 of 15: a face of its own
    with BuildSketch(Plane.XY):
        Polygon((80.1505, -18.896897552), (81.838397552, -17.209), (80.1505, -17.209), align=None)
    # profile 13 of 15: a face of its own
    with BuildSketch(Plane.XY):
        Polygon((183.638060889, -42.289), (188.832939111, -42.289), (190.7755, -40.346439111), (190.7755, -26.101102448), (192.2755, -24.601102448), (192.2755, -18.896897552), (190.587602448, -17.209), (181.883397552, -17.209), (180.1955, -18.896897552), (180.1955, -24.601102448), (181.6955, -26.101102448), (181.6955, -40.346439111), align=None)
        with BuildLine():
            Line((188.2355, -39.294336663), (187.780836663, -39.749))
            Line((187.780836663, -39.749), (184.690163337, -39.749))
            Line((184.690163337, -39.749), (184.2355, -39.294336663))
            Line((184.2355, -39.294336663), (184.2355, -23.949))
            ThreePointArc((184.2355, -23.949), (184.176921356, -23.807578644), (184.0355, -23.749))
            Line((184.0355, -23.749), (182.9355, -23.749))
            Line((182.9355, -23.749), (182.7355, -23.549))
            Line((182.7355, -23.549), (182.7355, -19.949))
            Line((182.7355, -19.949), (182.9355, -19.749))
            Line((182.9355, -19.749), (189.5355, -19.749))
            Line((189.5355, -19.749), (189.7355, -19.949))
            Line((189.7355, -19.949), (189.7355, -23.549))
            Line((189.7355, -23.549), (189.5355, -23.749))
            Line((189.5355, -23.749), (188.4355, -23.749))
            ThreePointArc((188.4355, -23.749), (188.294078644, -23.807578644), (188.2355, -23.949))
            Line((188.2355, -23.949), (188.2355, -39.294336663))
        make_face(mode=Mode.SUBTRACT)
    # profile 14 of 15: a face of its own
    with BuildSketch(Plane.XY):
        Polygon((190.587602448, -17.209), (192.2755, -18.896897552), (192.2755, -17.209), align=None)
    # profile 15 of 15: a face of its own
    with BuildSketch(Plane.XY):
        Polygon((180.1955, -17.209), (180.1955, -18.896897552), (181.883397552, -17.209), align=None)
    extrude(amount=-CUT_EXTRUDE5_DEPTH, mode=Mode.SUBTRACT)


with BuildPart() as cut_extrude5_kept_piece:
    # of the separate pieces the step leaves, the one the design keeps (cut_extrude5_pieces_kept)
    add(part.part.solids().sort_by_distance((-222.13299998, -23.749, 0))[0])

    # Fillet1
    fillet1_edges = [cut_extrude5_kept_piece.edges().sort_by_distance(p)[0] for p in [
        (-170.952499984, -17.209, -1.143),
        (-183.032499984, -17.209, -1.143),
        (-89.383499992, -17.209, -1.143),
        (-101.463499992, -17.209, -1.143),
        (10.661500008, -17.209, -1.143),
        (-1.418499992, -17.209, -1.143),
        (92.2305, -17.209, -1.143),
        (80.1505, -17.209, -1.143),
        (192.2755, -17.209, -1.143),
        (180.1955, -17.209, -1.143),
    ]]
    fillet(fillet1_edges, radius=FILLET1_R)

    # Sketch57 → Cut-Extrude6 (cut, through all)
    with BuildSketch(Plane.XY):
        with Locations((191.5365, 0.141)):
            Circle(SKETCH57_R)
        with Locations((145.3365, 0.141)):
            Circle(SKETCH57_R)
        with Locations((-18.1115, -15.859)):
            Circle(SKETCH57_R)
        with Locations((-67.1115, -15.859)):
            Circle(SKETCH57_R)
        with Locations((-139.3365, 2.141)):
            Circle(SKETCH57_R)
        with Locations((-185.5365, 2.141)):
            Circle(SKETCH57_R)
    extrude(amount=-CUT_EXTRUDE6_DEPTH, mode=Mode.SUBTRACT)


solid = cut_extrude5_kept_piece.part
